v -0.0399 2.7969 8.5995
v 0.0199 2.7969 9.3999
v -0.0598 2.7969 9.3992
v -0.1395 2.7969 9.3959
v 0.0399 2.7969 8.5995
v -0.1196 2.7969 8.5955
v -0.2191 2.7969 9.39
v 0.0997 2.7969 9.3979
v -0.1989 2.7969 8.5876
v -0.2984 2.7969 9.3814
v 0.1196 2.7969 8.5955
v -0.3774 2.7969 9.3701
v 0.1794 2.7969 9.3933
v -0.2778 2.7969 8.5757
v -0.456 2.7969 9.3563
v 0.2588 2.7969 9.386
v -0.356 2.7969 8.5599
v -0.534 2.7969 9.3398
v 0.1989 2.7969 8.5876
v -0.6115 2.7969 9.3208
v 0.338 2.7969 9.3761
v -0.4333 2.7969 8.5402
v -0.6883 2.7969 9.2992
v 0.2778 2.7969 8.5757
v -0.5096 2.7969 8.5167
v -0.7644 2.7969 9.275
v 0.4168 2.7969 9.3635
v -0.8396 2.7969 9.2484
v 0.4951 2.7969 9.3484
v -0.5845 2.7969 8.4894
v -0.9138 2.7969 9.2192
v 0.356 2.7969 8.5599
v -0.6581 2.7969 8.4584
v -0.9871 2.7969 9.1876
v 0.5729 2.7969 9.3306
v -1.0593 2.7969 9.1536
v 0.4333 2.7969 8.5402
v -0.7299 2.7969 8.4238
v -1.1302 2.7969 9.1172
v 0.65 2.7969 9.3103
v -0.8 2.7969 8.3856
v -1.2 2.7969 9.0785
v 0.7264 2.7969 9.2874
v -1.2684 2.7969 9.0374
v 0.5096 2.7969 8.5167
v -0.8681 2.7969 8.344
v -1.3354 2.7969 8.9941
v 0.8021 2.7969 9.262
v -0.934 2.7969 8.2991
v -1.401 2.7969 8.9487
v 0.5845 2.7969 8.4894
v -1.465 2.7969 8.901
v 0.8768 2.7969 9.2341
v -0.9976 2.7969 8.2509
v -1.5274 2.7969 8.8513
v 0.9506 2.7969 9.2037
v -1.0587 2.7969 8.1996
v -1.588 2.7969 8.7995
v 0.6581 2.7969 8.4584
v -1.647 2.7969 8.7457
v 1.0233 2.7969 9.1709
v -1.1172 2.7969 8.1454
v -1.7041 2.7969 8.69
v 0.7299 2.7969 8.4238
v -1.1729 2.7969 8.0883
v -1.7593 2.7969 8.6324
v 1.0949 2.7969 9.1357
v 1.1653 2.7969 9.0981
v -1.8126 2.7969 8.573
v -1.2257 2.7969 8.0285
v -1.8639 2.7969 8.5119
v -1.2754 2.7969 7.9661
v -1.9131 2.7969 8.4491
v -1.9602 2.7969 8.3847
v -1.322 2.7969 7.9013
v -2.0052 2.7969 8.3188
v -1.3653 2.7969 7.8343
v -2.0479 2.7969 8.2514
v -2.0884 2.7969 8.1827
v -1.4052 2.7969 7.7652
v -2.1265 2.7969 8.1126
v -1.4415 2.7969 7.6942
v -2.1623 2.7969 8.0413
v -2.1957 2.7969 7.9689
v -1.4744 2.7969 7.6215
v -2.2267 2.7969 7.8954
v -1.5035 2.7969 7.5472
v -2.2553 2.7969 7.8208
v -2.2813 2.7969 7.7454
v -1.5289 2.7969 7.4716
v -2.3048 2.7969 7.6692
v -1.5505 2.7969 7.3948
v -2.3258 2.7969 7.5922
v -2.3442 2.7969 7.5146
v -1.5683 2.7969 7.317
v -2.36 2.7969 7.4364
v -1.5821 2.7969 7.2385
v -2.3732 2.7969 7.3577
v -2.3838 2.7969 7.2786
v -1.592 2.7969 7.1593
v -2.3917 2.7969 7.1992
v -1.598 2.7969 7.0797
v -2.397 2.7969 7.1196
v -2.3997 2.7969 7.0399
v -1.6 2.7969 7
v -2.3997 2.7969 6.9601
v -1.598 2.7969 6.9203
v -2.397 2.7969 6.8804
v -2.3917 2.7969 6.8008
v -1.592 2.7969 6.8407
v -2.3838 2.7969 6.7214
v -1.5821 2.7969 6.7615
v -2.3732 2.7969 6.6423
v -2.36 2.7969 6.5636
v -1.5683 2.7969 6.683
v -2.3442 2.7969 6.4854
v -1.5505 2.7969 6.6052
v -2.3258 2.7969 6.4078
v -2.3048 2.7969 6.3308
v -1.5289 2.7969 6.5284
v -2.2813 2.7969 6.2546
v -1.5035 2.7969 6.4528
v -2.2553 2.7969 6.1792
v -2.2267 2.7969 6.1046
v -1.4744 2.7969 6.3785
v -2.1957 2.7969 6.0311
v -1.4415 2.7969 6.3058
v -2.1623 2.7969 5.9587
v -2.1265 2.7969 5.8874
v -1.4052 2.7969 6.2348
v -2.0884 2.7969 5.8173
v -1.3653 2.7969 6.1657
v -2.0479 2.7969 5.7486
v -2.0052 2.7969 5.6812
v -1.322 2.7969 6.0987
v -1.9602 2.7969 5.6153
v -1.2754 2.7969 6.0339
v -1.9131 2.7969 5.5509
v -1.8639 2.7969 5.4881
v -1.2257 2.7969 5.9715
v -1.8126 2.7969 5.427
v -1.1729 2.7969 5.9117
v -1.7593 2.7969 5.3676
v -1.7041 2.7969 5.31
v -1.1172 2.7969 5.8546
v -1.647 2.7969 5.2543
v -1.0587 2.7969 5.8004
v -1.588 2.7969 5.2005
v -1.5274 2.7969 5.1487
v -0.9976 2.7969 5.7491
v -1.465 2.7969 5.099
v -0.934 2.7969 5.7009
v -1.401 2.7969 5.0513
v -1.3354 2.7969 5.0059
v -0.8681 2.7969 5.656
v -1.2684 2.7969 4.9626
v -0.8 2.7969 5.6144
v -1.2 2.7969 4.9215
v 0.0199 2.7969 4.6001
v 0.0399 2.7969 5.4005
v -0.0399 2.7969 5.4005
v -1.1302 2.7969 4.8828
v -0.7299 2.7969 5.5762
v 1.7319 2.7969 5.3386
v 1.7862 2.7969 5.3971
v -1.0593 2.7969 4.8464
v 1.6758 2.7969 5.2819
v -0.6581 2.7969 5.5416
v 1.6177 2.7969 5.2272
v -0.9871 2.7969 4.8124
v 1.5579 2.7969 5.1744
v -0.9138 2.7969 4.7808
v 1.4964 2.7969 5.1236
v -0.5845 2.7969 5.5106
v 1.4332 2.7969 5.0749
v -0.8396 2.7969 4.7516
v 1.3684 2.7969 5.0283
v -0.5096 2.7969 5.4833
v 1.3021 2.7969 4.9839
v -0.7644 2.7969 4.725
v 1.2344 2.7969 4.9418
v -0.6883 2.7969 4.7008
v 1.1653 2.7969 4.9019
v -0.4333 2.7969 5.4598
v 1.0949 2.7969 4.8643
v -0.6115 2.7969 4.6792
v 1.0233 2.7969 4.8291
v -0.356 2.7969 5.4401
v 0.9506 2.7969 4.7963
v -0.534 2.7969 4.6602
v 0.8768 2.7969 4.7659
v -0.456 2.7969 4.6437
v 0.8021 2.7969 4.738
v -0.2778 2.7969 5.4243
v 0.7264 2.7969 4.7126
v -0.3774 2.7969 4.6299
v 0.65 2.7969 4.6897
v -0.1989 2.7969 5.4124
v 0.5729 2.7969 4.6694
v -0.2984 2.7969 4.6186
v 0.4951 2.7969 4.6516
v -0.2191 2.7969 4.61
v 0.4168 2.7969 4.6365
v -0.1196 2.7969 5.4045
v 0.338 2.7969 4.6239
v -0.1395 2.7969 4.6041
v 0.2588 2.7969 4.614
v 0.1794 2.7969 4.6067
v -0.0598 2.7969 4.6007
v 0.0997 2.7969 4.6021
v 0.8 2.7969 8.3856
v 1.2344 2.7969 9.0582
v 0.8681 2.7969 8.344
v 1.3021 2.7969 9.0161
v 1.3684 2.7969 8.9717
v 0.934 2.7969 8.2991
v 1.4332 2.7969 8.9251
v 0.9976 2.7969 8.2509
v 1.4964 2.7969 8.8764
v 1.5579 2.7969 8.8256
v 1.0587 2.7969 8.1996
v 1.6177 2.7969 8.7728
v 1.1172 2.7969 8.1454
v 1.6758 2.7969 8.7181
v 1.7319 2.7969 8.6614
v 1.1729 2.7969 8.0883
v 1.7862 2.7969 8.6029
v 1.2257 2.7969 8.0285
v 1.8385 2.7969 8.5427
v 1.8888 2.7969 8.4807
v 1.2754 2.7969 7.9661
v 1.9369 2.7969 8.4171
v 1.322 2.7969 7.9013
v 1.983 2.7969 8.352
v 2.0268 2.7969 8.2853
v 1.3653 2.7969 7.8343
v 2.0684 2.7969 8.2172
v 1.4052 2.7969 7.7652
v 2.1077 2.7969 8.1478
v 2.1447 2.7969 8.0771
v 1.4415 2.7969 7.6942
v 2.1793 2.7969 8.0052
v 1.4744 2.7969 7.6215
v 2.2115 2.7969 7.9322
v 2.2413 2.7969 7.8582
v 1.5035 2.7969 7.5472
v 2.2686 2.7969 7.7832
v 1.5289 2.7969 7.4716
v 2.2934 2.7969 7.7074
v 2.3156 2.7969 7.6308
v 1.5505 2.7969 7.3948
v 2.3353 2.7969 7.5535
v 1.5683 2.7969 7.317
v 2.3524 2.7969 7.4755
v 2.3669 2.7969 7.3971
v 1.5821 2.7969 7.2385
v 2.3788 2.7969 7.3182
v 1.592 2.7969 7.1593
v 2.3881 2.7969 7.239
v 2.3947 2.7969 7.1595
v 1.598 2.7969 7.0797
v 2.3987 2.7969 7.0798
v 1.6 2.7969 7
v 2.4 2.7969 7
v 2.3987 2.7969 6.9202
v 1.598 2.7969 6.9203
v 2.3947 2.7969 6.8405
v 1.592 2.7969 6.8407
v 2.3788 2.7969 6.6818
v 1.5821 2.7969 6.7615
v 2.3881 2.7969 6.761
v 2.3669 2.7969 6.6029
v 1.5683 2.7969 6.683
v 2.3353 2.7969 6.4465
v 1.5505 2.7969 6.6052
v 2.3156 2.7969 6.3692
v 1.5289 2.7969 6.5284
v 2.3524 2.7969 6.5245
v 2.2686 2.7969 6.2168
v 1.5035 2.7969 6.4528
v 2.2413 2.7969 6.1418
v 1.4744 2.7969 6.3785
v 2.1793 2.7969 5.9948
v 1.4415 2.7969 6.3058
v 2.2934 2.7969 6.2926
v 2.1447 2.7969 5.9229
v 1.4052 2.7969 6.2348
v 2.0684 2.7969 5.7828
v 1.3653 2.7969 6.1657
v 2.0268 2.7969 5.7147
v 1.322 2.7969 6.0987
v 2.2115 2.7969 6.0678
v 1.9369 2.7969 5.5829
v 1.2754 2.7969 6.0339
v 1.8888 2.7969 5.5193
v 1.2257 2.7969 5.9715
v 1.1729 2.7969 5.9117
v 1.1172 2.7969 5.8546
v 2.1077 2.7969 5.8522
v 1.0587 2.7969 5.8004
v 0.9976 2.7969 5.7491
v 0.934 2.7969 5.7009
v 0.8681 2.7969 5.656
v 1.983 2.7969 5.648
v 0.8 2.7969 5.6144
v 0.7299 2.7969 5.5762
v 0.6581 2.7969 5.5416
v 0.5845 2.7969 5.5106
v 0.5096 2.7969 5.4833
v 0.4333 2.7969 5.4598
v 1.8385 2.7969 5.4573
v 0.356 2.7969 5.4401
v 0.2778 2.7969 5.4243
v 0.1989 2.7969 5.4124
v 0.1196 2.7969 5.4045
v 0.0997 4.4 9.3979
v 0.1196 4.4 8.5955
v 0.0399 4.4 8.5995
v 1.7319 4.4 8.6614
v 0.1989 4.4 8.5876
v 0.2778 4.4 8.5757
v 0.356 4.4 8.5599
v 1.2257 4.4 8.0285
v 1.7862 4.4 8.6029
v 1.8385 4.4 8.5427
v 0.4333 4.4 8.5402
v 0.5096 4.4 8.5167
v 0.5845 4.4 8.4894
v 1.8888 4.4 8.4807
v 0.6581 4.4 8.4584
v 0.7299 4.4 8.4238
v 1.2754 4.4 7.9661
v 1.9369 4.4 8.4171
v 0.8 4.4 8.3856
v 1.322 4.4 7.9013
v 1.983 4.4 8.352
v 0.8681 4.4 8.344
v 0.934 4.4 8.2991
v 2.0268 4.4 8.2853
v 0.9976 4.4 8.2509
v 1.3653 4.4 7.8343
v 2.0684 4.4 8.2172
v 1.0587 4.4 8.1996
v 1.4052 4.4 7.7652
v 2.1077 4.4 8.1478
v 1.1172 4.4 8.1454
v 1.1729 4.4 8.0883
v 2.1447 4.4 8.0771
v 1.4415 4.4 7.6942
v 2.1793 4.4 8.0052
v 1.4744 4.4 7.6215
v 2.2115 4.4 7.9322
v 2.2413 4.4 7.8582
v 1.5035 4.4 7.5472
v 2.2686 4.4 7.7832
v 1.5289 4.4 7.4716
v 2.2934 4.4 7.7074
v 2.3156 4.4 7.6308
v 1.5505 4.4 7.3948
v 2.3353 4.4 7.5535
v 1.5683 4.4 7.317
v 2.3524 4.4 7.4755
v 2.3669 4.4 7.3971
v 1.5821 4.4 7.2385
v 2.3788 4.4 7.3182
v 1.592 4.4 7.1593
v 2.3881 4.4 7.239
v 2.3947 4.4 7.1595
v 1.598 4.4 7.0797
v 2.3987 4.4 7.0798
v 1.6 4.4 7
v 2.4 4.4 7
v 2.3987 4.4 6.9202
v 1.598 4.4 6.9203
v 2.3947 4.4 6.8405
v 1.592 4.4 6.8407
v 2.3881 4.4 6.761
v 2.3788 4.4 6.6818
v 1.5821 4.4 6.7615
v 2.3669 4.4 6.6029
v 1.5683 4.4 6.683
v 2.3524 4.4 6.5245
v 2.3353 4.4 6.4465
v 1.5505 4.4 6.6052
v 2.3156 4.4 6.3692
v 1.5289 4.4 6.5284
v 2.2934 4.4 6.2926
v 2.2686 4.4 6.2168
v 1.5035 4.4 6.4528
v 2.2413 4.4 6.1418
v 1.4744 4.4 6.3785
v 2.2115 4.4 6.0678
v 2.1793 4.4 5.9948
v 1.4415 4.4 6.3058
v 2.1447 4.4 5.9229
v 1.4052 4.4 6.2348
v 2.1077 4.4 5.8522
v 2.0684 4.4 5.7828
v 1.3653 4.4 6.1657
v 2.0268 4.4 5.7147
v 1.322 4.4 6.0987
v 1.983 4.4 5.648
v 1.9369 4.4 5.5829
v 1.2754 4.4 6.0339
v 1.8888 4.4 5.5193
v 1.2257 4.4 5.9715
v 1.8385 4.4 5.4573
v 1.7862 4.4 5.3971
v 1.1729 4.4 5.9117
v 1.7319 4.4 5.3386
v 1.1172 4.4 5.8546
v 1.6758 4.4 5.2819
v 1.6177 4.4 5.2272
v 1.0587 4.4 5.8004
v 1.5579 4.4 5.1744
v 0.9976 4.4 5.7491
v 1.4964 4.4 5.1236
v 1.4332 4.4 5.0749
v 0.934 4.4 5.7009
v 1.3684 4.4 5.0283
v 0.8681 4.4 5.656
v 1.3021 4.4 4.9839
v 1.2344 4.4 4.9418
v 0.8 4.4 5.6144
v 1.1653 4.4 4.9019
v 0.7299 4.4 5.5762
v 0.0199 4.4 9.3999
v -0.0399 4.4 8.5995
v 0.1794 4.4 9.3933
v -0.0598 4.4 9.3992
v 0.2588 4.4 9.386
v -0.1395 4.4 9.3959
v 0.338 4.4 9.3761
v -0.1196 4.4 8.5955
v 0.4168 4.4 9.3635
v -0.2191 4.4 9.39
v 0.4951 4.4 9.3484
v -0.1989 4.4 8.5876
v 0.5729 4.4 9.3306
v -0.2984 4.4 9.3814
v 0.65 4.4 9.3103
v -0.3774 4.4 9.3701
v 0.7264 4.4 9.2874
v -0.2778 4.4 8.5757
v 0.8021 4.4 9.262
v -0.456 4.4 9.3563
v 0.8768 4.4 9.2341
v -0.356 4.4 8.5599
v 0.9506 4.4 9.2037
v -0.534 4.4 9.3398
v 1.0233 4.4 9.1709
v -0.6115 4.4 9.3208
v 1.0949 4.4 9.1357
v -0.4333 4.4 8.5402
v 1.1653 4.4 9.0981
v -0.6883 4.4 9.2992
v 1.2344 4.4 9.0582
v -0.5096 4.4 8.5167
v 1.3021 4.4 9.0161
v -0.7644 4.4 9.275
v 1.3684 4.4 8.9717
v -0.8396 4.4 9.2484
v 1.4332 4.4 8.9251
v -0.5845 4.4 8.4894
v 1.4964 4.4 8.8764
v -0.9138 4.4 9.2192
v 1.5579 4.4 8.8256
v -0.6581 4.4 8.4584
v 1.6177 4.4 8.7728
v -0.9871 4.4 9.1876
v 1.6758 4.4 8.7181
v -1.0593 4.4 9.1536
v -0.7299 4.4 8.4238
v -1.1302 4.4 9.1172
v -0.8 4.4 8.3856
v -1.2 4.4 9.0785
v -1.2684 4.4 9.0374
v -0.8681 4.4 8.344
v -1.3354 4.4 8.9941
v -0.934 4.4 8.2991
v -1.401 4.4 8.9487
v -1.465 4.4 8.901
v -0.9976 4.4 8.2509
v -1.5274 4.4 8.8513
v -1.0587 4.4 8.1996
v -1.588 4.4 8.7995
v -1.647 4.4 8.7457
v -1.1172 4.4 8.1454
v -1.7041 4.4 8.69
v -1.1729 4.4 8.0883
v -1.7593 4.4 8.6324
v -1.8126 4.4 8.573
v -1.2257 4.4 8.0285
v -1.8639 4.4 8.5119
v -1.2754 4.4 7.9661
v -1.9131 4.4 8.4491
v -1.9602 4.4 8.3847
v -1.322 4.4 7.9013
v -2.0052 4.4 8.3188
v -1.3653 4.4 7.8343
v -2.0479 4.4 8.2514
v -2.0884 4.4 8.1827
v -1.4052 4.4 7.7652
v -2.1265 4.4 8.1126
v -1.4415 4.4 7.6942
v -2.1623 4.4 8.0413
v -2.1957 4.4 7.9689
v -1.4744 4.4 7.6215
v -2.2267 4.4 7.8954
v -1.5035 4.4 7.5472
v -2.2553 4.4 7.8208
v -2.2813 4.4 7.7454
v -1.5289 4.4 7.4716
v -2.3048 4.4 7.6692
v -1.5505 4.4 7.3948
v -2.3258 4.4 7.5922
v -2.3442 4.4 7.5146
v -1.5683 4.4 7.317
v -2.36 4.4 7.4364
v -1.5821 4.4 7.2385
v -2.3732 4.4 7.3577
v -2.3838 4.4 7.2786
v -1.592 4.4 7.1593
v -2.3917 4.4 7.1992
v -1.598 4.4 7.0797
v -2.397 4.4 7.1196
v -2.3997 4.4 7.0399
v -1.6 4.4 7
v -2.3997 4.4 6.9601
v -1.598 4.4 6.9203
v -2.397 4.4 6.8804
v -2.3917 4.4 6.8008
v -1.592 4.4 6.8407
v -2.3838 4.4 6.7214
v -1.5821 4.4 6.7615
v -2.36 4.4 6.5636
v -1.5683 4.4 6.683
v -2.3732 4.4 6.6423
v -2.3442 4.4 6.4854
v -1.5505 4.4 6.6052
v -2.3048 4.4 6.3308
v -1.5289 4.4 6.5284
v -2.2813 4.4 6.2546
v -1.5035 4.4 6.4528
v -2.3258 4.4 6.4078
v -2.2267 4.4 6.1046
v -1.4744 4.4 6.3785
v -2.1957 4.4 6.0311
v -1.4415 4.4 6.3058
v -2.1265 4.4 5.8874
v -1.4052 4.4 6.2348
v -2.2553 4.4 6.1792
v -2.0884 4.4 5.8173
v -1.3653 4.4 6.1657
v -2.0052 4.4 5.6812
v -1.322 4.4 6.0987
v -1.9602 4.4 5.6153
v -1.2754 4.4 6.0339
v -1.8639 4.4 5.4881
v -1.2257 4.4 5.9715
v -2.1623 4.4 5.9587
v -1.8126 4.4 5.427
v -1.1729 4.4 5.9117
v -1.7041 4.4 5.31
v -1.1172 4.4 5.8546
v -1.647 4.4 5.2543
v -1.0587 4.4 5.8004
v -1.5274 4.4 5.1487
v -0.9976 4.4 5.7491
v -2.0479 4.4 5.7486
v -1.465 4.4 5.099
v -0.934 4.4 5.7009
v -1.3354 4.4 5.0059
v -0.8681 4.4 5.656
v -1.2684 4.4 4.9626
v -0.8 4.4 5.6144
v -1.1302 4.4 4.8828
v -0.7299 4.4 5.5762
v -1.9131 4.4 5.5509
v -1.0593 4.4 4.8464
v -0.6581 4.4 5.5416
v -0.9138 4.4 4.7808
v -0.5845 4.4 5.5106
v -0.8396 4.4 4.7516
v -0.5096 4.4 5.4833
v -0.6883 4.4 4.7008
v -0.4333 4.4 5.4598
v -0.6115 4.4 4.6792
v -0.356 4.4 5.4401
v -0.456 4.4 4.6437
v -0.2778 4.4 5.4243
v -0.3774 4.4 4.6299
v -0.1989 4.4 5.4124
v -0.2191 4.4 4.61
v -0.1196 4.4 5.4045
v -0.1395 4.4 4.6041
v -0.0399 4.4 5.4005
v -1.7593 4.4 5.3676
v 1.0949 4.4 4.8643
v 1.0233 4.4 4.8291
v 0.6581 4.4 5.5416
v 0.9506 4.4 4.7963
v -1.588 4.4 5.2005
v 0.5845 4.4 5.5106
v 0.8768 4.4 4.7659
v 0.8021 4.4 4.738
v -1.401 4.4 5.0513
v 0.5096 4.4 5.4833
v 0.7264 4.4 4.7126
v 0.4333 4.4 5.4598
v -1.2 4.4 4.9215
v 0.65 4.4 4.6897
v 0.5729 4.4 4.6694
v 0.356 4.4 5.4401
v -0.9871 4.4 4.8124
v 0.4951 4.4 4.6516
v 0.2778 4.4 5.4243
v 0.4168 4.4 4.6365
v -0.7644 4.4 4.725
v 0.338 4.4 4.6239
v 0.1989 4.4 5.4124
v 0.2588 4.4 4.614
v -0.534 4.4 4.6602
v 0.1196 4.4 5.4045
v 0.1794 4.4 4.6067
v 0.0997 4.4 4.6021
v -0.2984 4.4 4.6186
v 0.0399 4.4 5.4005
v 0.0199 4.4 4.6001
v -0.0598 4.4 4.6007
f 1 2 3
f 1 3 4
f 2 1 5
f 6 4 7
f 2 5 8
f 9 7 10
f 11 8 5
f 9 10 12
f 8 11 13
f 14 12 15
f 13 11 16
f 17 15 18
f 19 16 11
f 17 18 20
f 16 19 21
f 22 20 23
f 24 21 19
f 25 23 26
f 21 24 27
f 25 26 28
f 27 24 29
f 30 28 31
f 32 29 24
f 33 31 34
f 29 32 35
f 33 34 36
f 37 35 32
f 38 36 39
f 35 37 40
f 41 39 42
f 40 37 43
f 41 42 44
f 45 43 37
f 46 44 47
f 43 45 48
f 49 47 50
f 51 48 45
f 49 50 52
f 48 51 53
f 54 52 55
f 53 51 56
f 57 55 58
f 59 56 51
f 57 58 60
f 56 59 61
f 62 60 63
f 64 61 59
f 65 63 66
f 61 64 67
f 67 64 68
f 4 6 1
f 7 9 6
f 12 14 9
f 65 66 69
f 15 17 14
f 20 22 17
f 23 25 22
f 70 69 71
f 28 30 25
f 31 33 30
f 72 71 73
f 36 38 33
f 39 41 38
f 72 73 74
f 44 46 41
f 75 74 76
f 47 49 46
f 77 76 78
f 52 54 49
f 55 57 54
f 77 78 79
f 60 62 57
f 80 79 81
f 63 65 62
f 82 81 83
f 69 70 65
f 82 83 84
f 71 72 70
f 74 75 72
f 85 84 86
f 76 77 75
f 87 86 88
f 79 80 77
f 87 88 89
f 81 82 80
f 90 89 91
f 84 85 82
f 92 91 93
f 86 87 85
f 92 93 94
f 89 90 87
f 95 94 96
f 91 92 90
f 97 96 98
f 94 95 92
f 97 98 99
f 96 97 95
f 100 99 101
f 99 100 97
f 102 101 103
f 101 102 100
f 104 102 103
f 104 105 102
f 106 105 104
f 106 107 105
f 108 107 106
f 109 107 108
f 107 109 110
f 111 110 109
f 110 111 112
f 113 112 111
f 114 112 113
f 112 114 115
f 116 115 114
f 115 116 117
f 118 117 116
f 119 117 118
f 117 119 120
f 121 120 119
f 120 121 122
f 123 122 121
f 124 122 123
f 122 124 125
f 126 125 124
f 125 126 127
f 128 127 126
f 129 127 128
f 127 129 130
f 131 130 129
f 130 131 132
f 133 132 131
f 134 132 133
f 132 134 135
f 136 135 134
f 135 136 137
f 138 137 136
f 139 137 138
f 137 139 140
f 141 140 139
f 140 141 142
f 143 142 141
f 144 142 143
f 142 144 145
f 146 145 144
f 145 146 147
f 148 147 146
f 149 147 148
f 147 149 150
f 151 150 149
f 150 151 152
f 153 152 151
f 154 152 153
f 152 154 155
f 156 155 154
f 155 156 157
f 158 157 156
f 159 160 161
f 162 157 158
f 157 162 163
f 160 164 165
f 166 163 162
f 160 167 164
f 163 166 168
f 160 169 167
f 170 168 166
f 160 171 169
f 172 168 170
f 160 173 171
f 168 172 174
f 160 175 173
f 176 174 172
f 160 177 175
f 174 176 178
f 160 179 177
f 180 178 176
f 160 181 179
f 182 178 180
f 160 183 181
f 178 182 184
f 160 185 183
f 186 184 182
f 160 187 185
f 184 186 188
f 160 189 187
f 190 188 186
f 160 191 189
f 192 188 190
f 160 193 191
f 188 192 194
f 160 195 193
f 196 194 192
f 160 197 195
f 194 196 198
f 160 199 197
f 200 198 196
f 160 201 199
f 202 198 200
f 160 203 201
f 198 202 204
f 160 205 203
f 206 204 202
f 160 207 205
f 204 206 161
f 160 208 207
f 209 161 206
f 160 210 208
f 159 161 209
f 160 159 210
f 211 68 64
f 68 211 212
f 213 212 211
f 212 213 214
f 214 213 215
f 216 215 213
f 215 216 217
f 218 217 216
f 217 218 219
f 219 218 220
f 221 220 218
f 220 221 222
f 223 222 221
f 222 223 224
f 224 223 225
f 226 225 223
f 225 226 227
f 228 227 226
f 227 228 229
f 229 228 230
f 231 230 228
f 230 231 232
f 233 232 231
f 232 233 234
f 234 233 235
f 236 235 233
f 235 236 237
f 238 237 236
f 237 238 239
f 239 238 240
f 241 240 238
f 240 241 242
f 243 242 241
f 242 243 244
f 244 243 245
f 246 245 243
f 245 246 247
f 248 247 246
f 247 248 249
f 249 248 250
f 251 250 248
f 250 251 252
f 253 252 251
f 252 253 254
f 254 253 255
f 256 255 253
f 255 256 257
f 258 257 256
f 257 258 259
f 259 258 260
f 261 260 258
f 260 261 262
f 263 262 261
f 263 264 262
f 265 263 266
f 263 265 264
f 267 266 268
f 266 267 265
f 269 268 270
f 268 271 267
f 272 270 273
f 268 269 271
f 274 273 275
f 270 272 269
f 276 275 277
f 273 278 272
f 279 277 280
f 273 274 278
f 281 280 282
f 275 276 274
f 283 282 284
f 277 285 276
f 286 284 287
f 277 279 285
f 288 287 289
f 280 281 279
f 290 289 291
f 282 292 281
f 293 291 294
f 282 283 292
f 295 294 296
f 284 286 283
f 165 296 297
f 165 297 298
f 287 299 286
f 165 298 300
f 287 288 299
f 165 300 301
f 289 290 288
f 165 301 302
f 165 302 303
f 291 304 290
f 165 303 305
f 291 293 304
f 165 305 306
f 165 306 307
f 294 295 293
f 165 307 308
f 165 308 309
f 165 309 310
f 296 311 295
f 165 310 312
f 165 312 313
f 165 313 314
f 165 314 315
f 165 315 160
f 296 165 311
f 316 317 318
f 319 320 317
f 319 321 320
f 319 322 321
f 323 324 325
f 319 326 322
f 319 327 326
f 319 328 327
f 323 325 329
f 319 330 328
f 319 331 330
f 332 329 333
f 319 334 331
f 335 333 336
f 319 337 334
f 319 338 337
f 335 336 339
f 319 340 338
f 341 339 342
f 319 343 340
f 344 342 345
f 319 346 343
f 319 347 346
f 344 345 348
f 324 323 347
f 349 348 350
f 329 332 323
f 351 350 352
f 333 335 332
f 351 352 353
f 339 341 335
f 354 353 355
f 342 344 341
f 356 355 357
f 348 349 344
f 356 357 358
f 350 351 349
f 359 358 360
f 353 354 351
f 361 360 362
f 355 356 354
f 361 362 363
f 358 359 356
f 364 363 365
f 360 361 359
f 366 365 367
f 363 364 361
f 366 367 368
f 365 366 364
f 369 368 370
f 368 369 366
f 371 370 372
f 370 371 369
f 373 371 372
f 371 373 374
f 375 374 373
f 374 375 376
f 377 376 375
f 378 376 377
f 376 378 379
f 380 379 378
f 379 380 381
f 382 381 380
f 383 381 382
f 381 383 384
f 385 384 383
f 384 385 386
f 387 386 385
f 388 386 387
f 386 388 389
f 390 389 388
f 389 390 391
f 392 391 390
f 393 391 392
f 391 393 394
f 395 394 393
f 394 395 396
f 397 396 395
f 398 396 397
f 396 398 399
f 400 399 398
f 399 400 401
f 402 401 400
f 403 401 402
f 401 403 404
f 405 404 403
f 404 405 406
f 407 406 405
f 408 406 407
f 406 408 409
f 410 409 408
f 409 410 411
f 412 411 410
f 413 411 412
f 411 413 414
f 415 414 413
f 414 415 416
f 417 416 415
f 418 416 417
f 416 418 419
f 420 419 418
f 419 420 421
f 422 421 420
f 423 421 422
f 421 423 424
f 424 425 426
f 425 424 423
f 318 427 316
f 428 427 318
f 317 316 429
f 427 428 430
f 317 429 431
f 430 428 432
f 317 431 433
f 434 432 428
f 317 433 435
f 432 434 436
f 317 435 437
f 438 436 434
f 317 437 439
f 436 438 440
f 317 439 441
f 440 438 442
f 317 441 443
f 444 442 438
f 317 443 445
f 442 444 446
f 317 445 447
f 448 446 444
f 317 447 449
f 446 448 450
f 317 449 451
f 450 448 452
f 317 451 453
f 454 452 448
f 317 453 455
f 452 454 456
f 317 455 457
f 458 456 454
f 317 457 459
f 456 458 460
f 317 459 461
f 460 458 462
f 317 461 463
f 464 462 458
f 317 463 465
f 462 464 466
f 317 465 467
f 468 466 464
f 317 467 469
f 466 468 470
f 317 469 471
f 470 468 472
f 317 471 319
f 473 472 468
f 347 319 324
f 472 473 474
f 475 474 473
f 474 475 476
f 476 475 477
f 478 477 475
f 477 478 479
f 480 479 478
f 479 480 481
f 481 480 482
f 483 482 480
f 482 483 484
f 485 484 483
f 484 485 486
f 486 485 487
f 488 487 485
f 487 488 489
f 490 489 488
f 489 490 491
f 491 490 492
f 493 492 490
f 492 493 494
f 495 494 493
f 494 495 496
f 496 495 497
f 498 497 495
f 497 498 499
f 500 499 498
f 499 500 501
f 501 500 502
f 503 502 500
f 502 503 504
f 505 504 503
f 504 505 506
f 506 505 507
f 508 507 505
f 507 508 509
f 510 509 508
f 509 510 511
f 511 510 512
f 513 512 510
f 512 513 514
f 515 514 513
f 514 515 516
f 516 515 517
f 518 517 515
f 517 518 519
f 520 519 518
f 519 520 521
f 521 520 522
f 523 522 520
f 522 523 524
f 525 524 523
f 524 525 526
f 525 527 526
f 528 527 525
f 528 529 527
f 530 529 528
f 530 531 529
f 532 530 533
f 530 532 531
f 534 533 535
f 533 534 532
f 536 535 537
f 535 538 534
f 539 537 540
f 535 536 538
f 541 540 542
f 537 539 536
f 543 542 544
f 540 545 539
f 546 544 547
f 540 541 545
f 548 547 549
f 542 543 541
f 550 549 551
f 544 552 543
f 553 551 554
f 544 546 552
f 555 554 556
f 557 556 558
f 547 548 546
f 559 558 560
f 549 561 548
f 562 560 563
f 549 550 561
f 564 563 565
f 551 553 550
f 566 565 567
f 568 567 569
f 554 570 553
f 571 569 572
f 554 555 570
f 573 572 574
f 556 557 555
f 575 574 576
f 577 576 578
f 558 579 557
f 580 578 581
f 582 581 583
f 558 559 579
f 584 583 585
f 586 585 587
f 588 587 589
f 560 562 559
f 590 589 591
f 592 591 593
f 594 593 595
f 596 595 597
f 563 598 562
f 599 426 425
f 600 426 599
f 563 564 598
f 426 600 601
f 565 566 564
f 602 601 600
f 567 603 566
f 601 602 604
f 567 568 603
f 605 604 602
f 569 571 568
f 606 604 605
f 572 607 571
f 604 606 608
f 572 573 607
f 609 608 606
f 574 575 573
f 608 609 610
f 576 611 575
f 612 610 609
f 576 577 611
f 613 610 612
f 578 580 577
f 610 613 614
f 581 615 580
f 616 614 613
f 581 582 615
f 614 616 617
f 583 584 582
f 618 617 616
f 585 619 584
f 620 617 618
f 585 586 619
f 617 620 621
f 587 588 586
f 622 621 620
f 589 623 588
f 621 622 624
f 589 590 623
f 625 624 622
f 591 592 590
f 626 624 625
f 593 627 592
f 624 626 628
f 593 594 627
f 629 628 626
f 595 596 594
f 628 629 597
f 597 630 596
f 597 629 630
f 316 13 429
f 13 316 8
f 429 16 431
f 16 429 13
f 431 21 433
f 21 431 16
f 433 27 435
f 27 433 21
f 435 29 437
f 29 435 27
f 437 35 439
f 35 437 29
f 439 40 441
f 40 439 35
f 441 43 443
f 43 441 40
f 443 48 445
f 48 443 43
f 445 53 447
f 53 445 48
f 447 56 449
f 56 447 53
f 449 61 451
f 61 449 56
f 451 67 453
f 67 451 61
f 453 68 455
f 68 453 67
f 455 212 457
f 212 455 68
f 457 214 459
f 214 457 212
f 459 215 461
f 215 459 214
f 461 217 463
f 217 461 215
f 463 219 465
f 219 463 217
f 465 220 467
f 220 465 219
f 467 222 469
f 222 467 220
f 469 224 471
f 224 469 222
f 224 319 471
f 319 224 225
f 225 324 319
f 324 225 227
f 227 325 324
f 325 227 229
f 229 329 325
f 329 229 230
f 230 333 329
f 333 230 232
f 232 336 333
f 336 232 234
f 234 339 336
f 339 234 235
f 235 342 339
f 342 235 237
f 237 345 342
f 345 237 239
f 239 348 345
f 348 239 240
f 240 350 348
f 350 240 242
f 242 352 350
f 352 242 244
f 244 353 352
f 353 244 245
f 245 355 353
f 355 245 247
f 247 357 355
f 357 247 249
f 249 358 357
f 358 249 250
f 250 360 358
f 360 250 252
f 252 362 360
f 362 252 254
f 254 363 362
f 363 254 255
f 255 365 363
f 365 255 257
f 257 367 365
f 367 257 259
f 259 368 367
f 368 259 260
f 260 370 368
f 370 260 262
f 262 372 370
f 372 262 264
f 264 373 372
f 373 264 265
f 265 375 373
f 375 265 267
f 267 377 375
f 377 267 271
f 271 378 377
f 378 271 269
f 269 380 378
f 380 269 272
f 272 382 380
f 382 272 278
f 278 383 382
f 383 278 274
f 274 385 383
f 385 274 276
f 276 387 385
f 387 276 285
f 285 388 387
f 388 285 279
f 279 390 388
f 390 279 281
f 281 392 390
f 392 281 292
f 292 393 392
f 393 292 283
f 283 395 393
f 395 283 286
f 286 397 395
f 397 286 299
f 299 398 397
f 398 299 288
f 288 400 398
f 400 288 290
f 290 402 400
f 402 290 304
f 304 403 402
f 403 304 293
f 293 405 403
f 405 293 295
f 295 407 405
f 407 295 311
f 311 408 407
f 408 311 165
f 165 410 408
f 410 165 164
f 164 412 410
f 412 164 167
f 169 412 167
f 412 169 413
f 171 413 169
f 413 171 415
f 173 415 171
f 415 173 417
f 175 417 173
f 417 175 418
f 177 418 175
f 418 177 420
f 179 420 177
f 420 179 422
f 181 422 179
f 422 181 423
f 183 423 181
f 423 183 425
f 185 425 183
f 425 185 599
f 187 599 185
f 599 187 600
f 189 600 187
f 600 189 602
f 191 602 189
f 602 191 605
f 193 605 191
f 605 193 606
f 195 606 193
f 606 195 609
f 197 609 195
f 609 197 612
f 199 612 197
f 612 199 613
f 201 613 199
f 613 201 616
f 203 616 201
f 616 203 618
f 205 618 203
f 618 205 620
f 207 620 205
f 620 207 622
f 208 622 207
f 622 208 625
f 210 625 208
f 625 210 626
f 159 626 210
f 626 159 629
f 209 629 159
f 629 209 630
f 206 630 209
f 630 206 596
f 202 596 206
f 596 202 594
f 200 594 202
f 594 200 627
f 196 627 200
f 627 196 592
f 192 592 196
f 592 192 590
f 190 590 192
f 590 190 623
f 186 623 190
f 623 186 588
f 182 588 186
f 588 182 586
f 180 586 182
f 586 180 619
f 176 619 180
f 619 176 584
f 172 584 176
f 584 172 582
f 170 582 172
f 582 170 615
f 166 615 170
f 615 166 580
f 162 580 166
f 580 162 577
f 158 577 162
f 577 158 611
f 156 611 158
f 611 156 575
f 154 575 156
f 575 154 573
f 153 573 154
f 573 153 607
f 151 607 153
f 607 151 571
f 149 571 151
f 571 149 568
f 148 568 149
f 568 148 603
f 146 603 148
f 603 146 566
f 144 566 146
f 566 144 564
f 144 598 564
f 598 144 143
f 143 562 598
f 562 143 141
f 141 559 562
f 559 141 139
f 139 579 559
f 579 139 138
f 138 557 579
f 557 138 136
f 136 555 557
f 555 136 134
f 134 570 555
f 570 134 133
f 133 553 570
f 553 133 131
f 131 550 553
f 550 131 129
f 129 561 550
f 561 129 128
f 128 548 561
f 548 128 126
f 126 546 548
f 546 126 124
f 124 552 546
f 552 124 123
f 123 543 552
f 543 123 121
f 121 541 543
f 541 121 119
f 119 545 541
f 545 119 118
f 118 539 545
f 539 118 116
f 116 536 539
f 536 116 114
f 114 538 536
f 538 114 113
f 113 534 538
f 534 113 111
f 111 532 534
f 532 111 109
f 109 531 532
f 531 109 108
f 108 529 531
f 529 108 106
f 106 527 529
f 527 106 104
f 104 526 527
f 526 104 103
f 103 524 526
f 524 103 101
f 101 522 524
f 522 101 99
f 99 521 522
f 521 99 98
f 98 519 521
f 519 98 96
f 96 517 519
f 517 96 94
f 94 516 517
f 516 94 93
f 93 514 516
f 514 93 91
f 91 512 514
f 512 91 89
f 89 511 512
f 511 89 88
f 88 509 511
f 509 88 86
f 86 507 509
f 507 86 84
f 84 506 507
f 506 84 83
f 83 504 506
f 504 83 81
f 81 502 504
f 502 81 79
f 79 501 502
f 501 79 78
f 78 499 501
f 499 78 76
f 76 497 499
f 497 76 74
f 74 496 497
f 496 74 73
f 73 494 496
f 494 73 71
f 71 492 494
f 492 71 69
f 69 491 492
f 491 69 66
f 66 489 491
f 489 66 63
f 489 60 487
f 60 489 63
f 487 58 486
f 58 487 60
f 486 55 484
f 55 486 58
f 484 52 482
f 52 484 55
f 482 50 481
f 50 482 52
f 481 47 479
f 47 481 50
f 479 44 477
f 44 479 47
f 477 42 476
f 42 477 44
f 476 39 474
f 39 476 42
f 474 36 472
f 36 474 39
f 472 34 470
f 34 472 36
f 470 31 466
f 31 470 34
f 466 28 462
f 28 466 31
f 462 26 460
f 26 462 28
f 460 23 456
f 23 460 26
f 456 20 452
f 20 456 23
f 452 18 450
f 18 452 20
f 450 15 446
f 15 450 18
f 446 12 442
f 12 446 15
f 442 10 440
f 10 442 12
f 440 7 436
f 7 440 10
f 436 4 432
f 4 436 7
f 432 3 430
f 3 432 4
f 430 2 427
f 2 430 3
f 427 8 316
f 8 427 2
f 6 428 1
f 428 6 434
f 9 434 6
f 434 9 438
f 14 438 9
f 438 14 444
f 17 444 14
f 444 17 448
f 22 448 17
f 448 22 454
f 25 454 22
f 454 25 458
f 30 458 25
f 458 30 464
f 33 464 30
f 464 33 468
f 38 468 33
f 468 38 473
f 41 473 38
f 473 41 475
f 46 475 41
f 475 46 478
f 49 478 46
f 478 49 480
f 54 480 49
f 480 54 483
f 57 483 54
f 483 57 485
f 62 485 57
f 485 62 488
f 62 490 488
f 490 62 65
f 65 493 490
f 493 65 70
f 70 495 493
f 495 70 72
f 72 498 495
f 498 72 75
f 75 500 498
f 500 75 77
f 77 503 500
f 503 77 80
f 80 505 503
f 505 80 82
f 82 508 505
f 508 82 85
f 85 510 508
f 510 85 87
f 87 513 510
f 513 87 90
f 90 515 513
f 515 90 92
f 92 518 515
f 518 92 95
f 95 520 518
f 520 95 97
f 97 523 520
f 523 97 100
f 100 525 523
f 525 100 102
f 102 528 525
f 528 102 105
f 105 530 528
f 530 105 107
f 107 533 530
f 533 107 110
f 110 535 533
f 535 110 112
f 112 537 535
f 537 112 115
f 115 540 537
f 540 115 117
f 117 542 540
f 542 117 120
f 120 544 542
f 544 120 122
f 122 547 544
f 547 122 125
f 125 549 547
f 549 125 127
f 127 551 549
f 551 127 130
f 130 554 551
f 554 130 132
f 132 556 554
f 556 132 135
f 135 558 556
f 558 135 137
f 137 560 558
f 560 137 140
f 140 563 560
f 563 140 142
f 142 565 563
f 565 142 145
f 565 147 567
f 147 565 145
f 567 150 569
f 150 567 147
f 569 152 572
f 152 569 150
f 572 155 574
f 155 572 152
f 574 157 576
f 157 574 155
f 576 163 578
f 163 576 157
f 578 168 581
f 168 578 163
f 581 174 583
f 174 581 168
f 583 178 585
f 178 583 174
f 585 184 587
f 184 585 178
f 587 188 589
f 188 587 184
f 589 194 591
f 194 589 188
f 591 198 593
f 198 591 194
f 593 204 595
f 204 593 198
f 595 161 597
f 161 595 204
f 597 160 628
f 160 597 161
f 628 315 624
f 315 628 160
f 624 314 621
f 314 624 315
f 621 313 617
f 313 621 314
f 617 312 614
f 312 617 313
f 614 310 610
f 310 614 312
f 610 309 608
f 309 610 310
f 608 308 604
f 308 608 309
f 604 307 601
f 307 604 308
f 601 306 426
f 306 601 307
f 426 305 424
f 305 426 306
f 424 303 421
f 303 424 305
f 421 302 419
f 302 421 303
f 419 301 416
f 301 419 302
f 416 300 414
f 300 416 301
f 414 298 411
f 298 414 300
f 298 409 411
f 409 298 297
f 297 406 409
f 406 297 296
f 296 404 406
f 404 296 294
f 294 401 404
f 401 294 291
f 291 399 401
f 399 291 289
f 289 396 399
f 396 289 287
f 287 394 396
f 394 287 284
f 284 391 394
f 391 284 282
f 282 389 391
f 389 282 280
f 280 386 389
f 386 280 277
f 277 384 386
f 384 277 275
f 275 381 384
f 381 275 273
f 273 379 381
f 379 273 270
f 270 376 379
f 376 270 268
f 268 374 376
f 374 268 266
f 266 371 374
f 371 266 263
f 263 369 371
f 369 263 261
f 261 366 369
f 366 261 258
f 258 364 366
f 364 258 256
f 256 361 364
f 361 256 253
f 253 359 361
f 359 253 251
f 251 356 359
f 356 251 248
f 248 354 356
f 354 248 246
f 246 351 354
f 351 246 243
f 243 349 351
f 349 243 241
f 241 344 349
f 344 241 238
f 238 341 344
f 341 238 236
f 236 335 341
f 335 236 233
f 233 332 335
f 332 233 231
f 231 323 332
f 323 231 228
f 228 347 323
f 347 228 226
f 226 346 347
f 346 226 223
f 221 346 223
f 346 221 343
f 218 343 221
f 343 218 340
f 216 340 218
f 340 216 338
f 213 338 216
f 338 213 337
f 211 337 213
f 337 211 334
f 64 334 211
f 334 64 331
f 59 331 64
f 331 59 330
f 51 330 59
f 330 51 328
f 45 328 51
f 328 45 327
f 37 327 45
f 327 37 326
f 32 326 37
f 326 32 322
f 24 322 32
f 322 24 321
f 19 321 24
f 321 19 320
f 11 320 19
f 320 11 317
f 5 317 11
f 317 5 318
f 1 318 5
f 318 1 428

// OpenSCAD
use <../lib.scad>
use <../p/4-4disc.scad>
use <../p/4-4ndis.scad>
use <s/30375s01.scad>
use <s/30375s03.scad>
$fa=1; $fs=0.2;
function ldraw_lib__30375ps4(realsolid=false) = [
// 0 Minifig Mechanical Torso with Orange Dot Insignia Pattern
// 0 Name: 30375ps4.dat
// 0 Author: Magnus Forsberg [MagFors]
// 0 !LDRAW_ORG Part UPDATE 2016-01
// 0 !LICENSE Licensed under CC BY 2.0 and CC BY 4.0 : see CAreadme.txt
// 
// 0 BFC CERTIFY CCW
  [0,"BFC","CERTIFY"],
  [0,"BFC","CCW"],
// 
// 0 !KEYWORDS battle droid commander, Clone Wars, Episode One, Episode Two
// 0 !KEYWORDS minifig-scale, set 75043, set 75092, set 9515, Star Wars
// 
// 0 !CMDLINE -c19
// 
// 0 !HISTORY 2016-12-31 [PTadmin] Official Update 2016-01
// 
// 
// 1 16 0 0 0 1 0 0 0 1 0 0 0 1 s\30375s01.dat
  [1,16,0,0,0,1,0,0,0,1,0,0,0,1, ldraw_lib__s__30375s01(realsolid)],
// 1 16 0 0 0 1 0 0 0 1 0 0 0 1 s\30375s03.dat
  [1,16,0,0,0,1,0,0,0,1,0,0,0,1, ldraw_lib__s__30375s03(realsolid)],
// 
// 1 25 0 -22 -8.725 2 0 0 0 0.062442 -1.996097 0 0.998049 0.124884 4-4disc.dat
  [1,25,0,-22,-8.725,2,0,0,0,0.062442,-1.996097,0,0.998049,0.124884, ldraw_lib__4_4disc(realsolid)],
// 1 16 0 -22 -8.725 2 0 0 0 0.062442 -1.996097 0 0.998049 0.124884 4-4ndis.dat
  [1,16,0,-22,-8.725,2,0,0,0,0.062442,-1.996097,0,0.998049,0.124884, ldraw_lib__4_4ndis(realsolid)],
// 4 16 -6 -20 -8.85 -2 -20 -8.85 -2 -24 -8.6 -6 -24 -8.6
  [4,16,-6,-20,-8.85,-2,-20,-8.85,-2,-24,-8.6,-6,-24,-8.6],
// 4 16 2 -20 -8.85 6 -20 -8.85 6 -24 -8.6 2 -24 -8.6
  [4,16,2,-20,-8.85,6,-20,-8.85,6,-24,-8.6,2,-24,-8.6],
];
module ldraw_lib__30375ps4(step=0, col=false, unit=2/5, alt=false, line=0.2, solid=!$preview)
    makepoly(ldraw_lib__30375ps4(solid), step=step, col=col, unit=unit, alt=alt, line=line, solid=solid);
ldraw_lib__30375ps4(line=0.2);
